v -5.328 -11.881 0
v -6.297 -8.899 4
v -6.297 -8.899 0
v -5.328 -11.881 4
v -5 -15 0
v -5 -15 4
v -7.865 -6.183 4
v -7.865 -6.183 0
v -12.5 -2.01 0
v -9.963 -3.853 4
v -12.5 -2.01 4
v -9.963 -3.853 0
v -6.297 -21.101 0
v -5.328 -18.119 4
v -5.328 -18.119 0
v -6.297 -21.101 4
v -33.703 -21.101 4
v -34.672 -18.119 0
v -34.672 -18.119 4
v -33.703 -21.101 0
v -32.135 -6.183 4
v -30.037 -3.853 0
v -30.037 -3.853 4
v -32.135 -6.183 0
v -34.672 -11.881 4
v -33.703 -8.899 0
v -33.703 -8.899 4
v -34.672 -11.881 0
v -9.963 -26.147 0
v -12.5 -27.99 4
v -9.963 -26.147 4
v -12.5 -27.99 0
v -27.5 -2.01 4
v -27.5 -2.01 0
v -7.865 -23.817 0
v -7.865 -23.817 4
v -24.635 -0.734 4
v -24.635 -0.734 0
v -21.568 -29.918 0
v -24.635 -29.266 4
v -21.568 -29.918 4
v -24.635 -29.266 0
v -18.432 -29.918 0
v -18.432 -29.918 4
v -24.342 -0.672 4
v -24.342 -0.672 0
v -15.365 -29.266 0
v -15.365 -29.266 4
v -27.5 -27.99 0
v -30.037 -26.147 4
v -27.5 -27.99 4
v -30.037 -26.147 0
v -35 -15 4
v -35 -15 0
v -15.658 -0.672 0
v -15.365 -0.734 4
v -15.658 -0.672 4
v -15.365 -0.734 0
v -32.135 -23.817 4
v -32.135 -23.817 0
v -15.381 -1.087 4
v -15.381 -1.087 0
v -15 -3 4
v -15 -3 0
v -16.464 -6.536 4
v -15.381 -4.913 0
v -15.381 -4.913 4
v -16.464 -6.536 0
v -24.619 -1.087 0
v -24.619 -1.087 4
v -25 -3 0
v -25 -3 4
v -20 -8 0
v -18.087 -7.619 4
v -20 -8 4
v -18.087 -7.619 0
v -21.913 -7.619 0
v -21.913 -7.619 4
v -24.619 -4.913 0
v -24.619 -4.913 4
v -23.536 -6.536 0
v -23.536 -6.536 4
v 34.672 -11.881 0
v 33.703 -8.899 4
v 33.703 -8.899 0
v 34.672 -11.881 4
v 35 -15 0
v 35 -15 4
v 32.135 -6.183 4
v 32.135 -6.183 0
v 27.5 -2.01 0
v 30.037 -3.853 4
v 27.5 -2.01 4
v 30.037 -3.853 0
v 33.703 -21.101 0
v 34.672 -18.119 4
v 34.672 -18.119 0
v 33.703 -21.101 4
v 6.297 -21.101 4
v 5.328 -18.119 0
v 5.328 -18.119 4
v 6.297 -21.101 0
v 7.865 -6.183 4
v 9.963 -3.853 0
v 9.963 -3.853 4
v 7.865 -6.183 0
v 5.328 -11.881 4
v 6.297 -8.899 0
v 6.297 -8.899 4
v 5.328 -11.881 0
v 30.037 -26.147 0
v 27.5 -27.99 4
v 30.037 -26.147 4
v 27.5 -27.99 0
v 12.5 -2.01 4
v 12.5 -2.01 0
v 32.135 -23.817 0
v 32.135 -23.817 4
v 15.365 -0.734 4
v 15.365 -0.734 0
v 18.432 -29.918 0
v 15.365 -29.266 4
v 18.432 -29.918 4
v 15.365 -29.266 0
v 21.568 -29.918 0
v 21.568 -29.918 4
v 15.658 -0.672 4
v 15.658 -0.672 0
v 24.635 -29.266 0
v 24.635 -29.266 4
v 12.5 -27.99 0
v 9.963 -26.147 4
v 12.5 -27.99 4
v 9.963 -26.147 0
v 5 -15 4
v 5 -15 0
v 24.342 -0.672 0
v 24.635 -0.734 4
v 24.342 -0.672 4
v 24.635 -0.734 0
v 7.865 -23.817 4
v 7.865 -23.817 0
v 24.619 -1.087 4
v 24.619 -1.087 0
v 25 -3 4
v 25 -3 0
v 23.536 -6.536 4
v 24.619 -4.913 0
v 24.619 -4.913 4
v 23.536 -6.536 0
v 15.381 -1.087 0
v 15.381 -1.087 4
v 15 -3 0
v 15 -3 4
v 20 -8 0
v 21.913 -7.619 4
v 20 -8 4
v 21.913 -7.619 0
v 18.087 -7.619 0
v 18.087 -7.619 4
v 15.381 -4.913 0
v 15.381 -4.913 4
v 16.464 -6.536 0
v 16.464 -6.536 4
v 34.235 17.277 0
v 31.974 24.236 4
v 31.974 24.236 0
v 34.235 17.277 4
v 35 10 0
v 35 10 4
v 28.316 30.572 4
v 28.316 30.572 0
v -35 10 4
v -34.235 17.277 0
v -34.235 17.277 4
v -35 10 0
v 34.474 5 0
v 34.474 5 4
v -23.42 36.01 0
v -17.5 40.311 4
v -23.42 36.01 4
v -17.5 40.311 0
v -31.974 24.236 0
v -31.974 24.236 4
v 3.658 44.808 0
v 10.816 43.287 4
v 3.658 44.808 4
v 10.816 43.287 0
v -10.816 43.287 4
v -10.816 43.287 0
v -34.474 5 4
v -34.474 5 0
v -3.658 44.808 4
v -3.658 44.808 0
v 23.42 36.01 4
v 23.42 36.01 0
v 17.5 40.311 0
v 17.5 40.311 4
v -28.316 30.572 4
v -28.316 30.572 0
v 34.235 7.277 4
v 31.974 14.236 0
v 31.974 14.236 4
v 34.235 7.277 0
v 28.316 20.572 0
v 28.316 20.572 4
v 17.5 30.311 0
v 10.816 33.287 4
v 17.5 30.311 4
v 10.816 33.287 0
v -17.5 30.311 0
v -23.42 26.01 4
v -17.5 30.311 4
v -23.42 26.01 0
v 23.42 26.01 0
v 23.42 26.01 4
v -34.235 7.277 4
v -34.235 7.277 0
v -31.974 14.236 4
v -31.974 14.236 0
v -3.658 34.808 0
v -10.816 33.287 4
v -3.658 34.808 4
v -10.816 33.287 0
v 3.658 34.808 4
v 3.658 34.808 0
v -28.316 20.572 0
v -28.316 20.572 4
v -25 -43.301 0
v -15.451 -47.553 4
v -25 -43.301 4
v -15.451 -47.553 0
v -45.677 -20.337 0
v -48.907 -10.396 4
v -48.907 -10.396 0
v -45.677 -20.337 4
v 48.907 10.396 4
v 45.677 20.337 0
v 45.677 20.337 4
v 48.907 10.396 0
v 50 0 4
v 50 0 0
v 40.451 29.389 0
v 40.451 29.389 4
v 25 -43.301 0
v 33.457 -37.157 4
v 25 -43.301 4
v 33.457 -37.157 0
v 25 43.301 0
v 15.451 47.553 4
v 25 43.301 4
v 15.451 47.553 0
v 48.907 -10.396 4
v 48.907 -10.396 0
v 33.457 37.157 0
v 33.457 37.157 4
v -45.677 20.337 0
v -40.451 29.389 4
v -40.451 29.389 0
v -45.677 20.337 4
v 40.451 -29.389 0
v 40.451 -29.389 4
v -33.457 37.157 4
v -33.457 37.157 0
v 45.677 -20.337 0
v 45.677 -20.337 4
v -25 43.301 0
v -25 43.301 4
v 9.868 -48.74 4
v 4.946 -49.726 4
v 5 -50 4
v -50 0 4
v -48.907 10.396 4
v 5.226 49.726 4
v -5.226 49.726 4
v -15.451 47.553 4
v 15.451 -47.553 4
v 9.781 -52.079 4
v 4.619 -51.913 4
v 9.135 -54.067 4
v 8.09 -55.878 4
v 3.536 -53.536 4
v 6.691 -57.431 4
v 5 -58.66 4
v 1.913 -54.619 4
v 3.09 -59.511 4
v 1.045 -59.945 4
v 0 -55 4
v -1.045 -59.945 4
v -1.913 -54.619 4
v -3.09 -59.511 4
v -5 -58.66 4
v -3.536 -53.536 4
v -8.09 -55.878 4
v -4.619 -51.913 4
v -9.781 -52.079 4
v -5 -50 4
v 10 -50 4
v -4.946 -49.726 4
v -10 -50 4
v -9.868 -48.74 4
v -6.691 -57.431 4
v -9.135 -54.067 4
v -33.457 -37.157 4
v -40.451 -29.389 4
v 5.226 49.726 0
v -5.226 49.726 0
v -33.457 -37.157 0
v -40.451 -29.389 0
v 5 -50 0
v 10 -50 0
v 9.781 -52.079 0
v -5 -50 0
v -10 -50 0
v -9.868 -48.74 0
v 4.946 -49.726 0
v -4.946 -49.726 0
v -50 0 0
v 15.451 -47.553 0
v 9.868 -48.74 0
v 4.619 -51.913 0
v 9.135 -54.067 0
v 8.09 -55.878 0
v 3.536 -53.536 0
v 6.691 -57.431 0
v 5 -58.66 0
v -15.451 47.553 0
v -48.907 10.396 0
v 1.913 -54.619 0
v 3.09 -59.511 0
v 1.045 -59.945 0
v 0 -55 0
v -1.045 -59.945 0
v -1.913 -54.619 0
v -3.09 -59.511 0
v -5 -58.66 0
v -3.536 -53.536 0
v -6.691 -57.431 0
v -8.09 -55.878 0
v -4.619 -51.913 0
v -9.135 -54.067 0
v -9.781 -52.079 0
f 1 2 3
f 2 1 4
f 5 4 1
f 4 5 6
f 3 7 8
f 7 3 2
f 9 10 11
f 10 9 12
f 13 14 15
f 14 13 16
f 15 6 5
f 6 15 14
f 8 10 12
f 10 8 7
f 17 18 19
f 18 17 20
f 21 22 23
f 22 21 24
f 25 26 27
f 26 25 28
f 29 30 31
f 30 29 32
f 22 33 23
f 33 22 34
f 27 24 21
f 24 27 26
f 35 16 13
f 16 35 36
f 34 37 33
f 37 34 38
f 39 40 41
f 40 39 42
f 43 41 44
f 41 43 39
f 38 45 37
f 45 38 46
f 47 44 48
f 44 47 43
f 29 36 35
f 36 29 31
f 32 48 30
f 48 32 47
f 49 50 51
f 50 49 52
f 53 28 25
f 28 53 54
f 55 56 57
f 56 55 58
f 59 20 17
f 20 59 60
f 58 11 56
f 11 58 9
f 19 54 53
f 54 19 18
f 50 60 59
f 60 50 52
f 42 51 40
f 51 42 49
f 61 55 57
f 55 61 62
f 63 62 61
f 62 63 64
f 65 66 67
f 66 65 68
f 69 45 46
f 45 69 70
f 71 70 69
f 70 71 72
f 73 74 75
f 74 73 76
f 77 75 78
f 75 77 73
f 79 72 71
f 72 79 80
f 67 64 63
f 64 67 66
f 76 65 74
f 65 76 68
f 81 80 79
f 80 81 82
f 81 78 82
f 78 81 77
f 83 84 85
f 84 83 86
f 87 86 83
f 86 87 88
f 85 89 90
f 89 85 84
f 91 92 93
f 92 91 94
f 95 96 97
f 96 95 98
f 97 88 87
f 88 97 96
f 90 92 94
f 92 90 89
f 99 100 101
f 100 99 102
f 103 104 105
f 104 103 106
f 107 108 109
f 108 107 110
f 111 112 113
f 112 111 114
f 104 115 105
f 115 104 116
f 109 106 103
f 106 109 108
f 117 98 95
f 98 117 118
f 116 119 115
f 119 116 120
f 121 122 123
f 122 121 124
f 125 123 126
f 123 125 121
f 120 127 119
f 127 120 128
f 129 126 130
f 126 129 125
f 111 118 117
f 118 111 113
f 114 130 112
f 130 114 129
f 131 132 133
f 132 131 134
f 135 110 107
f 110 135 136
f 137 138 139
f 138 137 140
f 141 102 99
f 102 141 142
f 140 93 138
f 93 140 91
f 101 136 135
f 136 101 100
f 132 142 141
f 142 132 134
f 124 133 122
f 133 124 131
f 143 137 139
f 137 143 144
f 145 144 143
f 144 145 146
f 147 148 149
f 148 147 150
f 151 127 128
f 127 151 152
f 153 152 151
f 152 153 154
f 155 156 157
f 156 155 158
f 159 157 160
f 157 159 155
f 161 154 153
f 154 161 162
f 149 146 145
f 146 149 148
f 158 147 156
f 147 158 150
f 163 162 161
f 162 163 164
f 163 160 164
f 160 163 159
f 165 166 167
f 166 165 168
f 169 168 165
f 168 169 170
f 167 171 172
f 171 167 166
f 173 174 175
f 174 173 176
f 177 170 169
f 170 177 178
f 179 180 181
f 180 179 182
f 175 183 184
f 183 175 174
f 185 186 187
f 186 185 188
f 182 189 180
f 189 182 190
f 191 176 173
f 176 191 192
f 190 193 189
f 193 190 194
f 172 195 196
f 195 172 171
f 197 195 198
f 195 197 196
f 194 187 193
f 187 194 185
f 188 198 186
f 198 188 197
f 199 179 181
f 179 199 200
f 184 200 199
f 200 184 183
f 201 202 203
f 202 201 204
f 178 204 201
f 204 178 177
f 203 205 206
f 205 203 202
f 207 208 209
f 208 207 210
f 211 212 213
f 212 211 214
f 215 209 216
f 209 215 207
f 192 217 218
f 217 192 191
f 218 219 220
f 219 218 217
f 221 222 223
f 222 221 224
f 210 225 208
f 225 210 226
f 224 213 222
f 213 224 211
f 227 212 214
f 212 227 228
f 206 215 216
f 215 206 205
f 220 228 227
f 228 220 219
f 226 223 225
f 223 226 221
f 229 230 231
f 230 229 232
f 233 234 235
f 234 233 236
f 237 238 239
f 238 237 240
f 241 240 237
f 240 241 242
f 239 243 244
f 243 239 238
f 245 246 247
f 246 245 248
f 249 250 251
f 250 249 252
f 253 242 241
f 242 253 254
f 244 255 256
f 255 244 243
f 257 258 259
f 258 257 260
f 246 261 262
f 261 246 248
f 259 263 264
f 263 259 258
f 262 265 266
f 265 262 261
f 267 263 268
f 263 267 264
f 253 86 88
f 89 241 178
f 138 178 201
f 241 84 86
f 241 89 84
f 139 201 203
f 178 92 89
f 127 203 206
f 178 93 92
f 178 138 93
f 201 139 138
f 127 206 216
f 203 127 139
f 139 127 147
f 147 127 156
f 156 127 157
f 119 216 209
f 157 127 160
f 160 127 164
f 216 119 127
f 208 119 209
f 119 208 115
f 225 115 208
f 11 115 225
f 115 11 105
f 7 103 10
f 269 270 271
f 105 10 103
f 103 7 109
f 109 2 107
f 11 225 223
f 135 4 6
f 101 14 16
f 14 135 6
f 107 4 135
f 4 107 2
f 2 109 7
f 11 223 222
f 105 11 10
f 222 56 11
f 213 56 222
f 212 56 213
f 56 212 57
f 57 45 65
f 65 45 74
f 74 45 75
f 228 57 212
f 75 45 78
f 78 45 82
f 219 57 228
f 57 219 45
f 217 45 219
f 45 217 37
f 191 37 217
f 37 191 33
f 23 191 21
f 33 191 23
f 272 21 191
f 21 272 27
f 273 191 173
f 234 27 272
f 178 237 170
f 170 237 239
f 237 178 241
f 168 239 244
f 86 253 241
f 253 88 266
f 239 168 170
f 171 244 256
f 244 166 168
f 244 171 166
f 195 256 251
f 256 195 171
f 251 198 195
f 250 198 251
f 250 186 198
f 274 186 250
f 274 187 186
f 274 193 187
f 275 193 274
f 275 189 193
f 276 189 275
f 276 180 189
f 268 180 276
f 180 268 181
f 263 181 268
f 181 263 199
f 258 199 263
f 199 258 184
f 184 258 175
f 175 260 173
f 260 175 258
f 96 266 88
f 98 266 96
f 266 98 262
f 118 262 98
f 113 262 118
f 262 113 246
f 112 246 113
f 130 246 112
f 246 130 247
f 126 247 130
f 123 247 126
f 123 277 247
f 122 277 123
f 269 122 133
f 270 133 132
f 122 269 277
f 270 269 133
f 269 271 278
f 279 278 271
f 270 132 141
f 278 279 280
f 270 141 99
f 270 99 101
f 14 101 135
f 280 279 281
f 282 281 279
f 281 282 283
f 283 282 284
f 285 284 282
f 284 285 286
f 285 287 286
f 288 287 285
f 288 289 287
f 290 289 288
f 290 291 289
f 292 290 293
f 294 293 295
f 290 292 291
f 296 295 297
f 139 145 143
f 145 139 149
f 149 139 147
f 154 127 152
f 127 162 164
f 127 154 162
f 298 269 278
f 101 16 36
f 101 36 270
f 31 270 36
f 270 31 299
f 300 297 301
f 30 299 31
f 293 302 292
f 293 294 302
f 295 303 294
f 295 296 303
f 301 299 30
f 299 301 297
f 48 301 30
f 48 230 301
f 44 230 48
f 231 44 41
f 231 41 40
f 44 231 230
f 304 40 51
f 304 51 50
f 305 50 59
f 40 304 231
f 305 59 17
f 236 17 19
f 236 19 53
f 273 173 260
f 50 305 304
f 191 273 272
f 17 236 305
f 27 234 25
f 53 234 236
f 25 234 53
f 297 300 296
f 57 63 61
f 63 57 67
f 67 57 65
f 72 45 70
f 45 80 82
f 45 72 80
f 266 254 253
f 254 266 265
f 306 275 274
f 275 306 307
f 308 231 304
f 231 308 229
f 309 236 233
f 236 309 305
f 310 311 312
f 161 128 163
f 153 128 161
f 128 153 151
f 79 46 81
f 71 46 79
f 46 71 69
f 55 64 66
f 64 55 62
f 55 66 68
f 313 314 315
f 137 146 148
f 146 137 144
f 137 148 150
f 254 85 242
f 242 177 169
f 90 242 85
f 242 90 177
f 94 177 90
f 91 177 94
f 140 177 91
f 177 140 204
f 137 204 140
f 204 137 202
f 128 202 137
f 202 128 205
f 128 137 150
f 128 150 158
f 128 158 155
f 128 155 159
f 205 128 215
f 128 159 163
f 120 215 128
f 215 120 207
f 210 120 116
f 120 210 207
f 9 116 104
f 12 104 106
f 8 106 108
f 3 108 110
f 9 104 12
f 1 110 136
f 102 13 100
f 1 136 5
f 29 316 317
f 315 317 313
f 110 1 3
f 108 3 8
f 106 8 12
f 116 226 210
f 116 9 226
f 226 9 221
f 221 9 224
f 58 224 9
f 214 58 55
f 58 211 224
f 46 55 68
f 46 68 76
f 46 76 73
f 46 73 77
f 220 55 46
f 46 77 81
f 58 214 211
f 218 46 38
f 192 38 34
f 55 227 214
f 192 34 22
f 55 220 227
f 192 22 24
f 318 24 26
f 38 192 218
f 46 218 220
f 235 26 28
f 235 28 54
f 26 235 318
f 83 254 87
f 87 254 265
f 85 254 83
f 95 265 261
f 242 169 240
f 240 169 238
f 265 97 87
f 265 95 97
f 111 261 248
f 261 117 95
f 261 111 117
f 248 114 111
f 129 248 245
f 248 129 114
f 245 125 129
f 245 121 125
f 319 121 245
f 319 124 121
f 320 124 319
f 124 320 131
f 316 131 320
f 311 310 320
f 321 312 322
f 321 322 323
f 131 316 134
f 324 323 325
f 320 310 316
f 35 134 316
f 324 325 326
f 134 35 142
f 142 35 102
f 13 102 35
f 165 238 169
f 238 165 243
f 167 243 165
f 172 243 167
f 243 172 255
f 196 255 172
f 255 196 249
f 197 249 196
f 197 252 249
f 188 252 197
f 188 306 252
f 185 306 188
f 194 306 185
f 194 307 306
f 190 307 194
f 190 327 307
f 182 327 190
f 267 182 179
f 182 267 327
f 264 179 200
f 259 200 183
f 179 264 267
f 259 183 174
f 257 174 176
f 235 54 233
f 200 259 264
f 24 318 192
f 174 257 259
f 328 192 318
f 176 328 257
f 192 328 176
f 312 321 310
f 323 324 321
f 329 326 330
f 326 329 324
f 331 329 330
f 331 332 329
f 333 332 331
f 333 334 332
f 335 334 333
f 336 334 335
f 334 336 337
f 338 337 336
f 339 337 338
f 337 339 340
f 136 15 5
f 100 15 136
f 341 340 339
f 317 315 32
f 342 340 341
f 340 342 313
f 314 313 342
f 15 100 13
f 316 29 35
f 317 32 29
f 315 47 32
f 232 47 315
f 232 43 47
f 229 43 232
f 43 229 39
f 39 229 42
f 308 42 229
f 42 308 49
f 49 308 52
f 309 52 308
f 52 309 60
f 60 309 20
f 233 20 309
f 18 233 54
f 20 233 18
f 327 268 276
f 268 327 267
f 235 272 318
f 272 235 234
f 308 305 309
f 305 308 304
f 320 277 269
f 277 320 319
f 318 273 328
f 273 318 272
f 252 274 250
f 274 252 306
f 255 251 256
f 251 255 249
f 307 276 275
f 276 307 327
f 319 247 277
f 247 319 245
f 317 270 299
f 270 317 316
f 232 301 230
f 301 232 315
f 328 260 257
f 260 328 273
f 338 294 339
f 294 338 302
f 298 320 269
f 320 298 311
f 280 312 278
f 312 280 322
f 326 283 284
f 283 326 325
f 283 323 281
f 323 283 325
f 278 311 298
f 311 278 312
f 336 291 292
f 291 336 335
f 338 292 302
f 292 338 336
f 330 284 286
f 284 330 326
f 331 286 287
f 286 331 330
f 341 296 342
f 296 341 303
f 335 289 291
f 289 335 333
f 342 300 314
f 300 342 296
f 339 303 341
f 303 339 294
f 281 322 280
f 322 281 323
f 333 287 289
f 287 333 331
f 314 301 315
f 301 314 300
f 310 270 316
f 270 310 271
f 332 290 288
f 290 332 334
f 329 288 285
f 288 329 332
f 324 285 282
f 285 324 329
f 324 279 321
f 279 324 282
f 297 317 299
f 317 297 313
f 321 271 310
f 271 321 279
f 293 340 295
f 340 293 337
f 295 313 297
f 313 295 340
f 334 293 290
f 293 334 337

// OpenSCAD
union() {
  difference() {
    cylinder(4, 50, 50);
    translate([-20, -15, -1]) difference() {
      cylinder(6, 15, 15);
      translate([0, 12, -1]) cylinder(8, 5, 5);
    }
    translate([20, -15, -1]) difference() {
      cylinder(6, 15, 15);
      translate([0, 12, -1]) cylinder(8, 5, 5);
    }
    difference() {
      translate([0, 10, -1]) cylinder(6, 35, 35);
      translate([0, 0, -1]) cylinder(8, 35, 35);
    }
  }
  translate([0, -50, 0]) difference() {
    cylinder(4, 10, 10);
    translate([0, 0, -1]) cylinder(6, 5, 5);
  }
}
